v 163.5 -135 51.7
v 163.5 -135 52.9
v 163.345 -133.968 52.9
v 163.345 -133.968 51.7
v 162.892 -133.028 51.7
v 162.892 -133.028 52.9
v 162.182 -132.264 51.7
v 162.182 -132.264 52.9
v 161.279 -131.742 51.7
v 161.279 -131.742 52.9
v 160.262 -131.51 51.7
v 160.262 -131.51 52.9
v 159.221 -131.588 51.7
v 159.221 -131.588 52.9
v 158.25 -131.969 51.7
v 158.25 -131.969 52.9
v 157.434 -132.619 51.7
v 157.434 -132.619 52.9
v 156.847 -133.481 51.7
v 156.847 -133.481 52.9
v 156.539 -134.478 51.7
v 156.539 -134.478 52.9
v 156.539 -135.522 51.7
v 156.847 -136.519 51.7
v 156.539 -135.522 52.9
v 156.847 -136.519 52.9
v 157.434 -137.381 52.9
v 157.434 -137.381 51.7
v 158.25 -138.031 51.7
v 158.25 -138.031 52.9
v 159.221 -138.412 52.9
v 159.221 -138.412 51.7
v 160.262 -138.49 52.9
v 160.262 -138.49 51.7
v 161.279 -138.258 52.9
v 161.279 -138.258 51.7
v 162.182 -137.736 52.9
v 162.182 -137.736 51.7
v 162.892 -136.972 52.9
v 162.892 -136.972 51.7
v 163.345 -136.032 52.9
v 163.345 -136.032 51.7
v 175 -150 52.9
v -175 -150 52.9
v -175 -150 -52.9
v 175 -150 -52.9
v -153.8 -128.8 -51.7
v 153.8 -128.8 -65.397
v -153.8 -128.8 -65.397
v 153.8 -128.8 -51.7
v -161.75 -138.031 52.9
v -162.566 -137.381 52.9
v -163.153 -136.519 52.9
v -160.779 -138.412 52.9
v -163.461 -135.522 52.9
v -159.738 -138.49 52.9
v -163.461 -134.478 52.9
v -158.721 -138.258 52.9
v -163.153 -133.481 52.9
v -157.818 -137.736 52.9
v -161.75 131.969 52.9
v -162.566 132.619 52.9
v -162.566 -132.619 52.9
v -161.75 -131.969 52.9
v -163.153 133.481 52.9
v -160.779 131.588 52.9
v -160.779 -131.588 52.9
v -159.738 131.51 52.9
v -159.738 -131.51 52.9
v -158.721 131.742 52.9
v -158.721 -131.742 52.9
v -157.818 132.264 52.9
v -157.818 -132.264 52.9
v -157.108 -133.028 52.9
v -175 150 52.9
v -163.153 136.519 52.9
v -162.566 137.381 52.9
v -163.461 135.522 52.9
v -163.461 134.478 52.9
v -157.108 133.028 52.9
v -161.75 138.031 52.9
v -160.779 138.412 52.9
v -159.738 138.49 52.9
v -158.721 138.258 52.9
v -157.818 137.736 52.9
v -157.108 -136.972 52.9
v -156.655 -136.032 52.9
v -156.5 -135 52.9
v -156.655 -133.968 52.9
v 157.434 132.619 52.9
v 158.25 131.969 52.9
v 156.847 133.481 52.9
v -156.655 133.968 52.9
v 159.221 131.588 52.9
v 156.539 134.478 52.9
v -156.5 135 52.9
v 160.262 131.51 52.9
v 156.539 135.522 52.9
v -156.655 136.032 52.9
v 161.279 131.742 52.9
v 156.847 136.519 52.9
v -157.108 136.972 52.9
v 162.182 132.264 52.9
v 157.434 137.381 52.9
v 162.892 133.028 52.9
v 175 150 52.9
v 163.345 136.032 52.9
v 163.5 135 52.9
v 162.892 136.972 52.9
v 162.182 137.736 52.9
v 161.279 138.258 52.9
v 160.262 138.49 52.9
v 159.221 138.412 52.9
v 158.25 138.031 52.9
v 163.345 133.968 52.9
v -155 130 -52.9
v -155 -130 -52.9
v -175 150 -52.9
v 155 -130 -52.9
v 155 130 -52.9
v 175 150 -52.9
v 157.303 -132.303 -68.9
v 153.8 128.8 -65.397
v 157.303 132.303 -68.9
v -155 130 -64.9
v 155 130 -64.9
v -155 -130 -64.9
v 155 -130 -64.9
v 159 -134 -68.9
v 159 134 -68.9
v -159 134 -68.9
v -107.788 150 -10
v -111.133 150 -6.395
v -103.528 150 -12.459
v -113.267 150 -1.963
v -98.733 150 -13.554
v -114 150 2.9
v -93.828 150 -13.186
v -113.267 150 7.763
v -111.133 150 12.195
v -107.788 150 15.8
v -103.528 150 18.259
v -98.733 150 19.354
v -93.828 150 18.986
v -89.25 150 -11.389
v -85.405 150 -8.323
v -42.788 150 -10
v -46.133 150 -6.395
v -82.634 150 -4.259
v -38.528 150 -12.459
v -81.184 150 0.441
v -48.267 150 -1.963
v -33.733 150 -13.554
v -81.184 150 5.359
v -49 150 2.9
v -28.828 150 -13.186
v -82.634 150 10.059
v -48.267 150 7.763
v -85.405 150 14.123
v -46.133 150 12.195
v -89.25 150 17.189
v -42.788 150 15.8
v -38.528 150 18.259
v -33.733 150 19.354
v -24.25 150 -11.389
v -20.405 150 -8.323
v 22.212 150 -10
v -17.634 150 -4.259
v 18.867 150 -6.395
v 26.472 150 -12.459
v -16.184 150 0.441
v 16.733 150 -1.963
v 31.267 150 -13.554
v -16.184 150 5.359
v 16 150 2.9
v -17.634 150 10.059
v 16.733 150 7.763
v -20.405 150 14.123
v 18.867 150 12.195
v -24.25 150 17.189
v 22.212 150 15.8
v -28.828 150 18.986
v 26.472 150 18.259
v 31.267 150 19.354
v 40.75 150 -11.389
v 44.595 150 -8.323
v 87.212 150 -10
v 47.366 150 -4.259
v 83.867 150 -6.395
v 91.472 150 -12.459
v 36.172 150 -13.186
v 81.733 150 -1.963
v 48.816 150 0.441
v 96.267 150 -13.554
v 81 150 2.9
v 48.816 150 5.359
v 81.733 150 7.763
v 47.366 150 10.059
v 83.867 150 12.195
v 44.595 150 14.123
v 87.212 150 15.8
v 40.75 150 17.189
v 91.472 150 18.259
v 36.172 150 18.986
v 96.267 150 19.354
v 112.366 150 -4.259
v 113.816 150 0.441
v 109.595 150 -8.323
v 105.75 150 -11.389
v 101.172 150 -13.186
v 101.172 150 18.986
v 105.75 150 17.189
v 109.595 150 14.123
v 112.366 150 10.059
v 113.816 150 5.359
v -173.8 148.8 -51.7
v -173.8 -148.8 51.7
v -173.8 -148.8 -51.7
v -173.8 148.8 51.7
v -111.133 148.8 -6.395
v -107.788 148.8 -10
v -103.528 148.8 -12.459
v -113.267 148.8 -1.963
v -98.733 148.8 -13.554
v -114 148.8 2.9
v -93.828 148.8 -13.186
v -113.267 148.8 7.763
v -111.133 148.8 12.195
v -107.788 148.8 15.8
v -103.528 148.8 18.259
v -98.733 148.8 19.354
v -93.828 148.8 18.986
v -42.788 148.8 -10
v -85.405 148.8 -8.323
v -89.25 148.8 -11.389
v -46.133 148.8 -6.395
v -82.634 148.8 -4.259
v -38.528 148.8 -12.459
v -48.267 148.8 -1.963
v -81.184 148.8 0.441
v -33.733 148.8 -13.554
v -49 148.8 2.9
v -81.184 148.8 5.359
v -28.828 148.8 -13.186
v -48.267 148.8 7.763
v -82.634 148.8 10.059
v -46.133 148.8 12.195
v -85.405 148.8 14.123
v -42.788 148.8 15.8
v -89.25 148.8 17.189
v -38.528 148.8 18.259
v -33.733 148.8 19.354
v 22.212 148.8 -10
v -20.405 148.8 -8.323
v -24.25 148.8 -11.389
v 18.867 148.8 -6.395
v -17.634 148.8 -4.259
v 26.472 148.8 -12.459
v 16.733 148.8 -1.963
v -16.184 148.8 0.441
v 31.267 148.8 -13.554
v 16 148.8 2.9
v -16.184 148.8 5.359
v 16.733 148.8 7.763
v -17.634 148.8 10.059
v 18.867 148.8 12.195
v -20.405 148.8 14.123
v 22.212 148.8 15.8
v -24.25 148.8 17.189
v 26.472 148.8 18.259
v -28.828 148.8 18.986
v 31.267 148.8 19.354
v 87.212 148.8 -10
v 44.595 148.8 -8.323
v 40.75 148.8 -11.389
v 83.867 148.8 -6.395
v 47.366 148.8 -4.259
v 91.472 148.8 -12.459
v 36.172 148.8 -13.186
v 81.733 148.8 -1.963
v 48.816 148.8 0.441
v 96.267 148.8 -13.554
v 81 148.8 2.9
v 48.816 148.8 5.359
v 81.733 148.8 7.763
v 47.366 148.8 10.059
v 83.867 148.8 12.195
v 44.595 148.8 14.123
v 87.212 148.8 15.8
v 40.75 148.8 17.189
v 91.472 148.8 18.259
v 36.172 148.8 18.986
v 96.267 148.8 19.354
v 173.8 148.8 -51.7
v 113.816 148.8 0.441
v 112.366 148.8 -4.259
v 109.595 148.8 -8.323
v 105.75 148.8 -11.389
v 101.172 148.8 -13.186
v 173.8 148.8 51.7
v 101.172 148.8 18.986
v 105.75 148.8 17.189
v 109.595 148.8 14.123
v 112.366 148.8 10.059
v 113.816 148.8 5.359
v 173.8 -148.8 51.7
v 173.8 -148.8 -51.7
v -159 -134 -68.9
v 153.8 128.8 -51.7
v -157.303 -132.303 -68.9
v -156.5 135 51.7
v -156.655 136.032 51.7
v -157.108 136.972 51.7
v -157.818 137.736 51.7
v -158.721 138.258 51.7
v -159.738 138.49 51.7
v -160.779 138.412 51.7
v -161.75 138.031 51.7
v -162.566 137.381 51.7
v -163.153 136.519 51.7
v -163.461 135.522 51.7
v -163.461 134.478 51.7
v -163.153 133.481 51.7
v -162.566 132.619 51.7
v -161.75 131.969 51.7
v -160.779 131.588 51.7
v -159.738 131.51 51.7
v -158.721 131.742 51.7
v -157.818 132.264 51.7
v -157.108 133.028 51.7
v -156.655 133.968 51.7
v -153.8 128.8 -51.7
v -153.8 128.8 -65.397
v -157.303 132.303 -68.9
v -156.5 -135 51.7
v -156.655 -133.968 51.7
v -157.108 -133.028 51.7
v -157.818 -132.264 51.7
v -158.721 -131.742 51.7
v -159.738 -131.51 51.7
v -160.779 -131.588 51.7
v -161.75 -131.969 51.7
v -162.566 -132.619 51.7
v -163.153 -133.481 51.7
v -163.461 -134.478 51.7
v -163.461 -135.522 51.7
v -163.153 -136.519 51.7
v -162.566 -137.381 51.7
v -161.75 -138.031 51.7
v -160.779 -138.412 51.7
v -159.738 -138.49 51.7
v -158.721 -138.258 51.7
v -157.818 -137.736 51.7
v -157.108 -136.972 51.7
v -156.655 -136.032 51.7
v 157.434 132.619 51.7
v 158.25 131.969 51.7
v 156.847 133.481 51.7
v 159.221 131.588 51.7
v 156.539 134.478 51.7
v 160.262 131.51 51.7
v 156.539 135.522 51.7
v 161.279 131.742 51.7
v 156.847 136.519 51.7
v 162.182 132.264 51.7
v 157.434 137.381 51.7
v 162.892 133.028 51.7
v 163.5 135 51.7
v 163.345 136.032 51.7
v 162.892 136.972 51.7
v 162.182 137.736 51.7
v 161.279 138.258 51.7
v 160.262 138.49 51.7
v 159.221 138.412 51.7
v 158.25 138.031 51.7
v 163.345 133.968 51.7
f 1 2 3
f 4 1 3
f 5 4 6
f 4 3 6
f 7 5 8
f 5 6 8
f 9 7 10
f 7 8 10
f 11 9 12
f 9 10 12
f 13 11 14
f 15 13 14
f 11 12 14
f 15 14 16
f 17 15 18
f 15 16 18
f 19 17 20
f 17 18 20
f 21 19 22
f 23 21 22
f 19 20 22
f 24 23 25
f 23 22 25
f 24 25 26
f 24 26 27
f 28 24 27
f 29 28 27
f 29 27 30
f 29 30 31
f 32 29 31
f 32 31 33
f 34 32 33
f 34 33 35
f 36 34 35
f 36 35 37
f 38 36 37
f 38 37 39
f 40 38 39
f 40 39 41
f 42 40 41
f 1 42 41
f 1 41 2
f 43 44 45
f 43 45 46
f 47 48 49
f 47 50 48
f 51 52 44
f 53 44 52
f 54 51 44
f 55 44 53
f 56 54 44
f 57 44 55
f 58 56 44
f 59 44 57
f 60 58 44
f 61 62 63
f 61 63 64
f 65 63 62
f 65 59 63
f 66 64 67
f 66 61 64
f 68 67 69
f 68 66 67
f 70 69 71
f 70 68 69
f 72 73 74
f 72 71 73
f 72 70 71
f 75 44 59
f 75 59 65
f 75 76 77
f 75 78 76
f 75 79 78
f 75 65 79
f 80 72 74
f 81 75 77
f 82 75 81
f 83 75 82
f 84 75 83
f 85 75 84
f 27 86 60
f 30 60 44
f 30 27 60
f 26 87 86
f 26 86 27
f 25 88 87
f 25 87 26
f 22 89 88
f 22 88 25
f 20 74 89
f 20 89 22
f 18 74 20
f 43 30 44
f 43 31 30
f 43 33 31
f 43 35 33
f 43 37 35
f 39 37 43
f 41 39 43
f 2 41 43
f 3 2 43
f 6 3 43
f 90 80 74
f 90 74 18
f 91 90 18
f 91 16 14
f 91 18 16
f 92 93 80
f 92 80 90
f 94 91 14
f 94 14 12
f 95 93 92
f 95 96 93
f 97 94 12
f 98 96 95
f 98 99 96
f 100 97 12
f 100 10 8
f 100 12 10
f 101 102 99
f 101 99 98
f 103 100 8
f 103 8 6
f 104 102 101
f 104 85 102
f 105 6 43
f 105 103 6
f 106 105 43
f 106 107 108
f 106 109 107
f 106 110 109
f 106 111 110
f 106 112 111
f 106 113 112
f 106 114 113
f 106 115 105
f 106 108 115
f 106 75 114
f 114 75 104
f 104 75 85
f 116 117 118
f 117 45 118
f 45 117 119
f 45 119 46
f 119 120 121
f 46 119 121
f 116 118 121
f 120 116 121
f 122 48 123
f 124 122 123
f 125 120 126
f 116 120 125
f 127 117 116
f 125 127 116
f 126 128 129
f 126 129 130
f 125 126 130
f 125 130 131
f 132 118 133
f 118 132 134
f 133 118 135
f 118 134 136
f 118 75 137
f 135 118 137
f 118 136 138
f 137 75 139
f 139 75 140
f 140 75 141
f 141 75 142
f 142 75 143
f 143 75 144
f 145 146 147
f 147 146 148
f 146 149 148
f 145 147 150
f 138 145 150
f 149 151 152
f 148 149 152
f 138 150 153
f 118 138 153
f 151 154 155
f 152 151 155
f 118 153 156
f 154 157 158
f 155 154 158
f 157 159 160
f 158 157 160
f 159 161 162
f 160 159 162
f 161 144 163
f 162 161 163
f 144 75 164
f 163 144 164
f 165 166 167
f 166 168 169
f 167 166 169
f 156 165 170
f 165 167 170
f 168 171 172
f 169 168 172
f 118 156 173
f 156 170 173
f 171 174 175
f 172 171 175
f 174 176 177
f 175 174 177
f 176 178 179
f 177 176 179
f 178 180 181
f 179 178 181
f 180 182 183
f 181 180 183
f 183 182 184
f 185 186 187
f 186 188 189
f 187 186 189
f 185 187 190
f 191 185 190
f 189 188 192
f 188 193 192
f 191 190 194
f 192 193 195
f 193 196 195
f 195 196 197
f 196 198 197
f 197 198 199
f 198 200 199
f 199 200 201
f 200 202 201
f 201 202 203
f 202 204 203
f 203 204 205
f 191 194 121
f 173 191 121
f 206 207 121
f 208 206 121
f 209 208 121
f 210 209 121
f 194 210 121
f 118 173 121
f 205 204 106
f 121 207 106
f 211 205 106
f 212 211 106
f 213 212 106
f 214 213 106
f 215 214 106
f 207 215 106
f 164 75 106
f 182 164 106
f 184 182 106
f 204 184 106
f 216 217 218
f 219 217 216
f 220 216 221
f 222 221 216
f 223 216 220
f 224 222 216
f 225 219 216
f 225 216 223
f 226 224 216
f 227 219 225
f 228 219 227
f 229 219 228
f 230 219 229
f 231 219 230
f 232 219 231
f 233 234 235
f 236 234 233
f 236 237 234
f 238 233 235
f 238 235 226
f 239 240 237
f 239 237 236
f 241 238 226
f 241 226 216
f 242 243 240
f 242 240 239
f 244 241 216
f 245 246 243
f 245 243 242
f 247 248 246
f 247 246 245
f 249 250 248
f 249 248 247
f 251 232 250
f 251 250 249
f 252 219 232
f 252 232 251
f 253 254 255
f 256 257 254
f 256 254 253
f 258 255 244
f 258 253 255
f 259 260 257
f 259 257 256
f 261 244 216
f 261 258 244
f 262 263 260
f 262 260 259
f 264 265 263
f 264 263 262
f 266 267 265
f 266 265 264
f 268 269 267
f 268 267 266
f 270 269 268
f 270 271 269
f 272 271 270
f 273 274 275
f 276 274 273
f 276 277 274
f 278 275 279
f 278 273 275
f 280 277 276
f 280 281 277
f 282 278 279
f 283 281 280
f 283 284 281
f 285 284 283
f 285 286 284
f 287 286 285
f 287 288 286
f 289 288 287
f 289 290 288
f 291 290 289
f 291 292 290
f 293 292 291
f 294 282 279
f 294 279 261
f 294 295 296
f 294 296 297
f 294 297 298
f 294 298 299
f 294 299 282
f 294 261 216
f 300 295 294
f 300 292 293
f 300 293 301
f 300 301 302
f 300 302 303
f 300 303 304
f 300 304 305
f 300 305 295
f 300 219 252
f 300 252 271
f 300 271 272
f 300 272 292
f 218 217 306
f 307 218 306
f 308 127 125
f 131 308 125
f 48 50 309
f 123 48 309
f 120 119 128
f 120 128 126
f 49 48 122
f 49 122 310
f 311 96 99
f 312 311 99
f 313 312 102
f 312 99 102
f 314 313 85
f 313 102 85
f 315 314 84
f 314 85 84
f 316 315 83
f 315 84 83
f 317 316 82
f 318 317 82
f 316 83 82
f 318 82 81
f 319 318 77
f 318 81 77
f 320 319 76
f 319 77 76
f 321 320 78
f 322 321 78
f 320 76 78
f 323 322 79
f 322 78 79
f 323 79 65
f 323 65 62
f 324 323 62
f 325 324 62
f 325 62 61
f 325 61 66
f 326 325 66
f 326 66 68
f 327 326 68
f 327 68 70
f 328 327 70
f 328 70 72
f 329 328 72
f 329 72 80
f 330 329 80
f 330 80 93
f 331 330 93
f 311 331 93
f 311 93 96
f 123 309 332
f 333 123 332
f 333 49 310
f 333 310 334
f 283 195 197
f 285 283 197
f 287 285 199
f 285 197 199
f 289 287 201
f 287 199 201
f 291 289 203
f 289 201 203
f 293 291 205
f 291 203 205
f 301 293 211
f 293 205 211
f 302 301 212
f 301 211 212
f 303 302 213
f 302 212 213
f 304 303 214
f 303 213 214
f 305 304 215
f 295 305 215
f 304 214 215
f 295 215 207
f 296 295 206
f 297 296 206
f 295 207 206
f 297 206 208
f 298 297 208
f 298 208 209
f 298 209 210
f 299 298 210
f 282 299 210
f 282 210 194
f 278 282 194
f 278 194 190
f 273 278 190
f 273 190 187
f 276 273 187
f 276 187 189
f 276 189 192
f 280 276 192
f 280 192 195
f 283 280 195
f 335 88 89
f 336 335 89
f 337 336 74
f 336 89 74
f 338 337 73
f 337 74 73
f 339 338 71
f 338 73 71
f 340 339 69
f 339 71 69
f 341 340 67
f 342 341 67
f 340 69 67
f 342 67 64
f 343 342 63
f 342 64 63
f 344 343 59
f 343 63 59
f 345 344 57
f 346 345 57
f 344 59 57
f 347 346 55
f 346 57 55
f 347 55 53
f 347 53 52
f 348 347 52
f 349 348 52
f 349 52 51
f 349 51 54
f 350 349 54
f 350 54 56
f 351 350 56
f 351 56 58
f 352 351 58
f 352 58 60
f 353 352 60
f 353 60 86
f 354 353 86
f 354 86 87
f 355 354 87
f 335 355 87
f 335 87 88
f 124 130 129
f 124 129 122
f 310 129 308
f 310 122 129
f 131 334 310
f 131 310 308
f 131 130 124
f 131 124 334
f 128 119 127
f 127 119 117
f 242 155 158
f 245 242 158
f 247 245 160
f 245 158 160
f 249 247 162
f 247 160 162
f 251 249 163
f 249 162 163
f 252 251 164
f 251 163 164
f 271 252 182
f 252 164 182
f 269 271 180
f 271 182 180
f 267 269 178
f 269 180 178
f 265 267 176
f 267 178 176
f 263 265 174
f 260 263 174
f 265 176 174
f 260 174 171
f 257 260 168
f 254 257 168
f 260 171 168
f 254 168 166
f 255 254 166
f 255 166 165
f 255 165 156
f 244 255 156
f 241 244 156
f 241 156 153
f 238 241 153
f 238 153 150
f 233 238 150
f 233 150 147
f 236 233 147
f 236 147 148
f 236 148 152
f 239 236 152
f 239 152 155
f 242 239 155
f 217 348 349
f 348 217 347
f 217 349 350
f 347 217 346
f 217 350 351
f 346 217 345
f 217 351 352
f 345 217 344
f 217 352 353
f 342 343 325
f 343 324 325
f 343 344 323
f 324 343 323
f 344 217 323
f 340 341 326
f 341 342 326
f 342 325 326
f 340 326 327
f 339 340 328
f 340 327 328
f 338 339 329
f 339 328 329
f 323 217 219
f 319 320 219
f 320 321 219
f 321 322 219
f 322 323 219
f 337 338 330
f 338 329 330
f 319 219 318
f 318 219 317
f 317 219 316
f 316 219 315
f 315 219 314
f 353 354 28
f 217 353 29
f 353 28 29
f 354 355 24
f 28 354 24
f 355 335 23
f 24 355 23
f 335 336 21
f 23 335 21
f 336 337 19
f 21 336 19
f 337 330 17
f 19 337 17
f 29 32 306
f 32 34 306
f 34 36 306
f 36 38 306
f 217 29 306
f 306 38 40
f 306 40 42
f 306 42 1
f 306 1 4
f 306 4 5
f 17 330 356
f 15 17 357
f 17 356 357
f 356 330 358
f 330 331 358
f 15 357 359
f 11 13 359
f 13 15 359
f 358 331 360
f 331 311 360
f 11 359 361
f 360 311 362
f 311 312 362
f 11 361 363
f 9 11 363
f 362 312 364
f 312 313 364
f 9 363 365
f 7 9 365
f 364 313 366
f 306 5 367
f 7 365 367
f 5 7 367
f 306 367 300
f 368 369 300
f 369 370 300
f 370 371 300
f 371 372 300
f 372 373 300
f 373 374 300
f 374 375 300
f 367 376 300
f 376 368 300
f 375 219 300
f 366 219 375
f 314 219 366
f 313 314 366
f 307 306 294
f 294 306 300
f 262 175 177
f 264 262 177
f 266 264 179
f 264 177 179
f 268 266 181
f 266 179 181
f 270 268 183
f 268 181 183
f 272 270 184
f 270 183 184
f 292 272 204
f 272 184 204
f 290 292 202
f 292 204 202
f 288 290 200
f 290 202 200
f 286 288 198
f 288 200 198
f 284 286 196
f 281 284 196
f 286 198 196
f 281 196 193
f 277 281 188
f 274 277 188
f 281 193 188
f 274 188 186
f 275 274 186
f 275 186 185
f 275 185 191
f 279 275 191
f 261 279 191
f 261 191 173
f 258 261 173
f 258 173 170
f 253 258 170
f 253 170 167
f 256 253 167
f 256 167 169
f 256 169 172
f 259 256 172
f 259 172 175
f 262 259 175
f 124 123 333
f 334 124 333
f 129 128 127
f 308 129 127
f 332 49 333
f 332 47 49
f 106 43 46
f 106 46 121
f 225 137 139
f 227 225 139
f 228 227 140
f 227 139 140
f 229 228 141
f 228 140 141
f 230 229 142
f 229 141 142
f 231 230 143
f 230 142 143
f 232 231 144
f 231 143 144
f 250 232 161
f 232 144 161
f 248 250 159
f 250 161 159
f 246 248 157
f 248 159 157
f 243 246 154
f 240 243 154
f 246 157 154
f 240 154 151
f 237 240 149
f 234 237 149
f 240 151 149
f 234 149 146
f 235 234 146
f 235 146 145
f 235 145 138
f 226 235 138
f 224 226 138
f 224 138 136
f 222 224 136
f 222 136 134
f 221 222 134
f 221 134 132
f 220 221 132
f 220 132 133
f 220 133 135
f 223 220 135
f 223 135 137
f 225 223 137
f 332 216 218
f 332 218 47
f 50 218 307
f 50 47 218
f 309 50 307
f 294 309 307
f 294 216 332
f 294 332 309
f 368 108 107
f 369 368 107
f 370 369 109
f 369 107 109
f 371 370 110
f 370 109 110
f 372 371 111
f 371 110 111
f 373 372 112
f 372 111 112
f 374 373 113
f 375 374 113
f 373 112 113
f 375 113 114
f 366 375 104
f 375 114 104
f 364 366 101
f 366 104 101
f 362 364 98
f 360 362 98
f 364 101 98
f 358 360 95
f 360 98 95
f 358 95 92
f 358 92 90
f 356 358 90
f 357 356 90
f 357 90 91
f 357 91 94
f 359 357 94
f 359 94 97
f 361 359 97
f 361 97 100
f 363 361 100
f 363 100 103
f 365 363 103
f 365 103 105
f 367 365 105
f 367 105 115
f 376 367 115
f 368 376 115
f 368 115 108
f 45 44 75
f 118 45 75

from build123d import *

# Parameters (mm, degrees)
SKETCH_1_W          = 350
SKETCH_1_H          = 300
EXTRUDE_1_DEPTH     = 52.9
SKETCH_2_W          = 310
SKETCH_2_H          = 260
EXTRUDE_2_DEPTH     = 12
SKETCH_6_W          = 310
SKETCH_6_H          = 260
EXTRUDE_3_DEPTH     = 4
EXTRUDE_3_DRAFT     = -45
SHELL_1_T           = -1.2
CUT_EXTRUDE_3_REACH = 262.692
SKETCH_12_R         = 3.5
CUT_EXTRUDE_4_REACH = 356.079
SKETCH_13_R         = 16.5


with BuildPart() as part:
    # 草图1 → 凸台-拉伸1 (new, symmetric)
    with BuildSketch(Plane.XY):
        Rectangle(SKETCH_1_W, SKETCH_1_H)
    extrude(amount=EXTRUDE_1_DEPTH, both=True)

    # 草图2 → 凸台-拉伸2 (add)
    with BuildSketch(Plane(origin=(0, 0, -52.9), x_dir=(-1, 0, 0), z_dir=(0, 0, -1))):
        Rectangle(SKETCH_2_W, SKETCH_2_H)
    extrude(amount=EXTRUDE_2_DEPTH)


with BuildPart() as extrude_3_tool:
    # 草图6 → 凸台-拉伸3 (with draft: the straight prism first)
    with BuildSketch(Plane(origin=(0, 0, -64.9), x_dir=(-1, 0, 0), z_dir=(0, 0, -1))):
        Rectangle(SKETCH_6_W, SKETCH_6_H)
    extrude(amount=EXTRUDE_3_DEPTH)
    # 凸台-拉伸3: the draft: its side faces are tilted about the plane it starts from
    extrude_3_sides = [extrude_3_tool.faces().sort_by_distance(p)[0] for p in [
        (155, 0, -66.9),
        (0, -130, -66.9),
        (-155, 0, -66.9),
        (0, 130, -66.9),
    ]]
    draft(extrude_3_sides, Plane(origin=(0, 0, -64.9), x_dir=(-1, 0, 0), z_dir=(0, 0, -1)), EXTRUDE_3_DRAFT)


with BuildPart() as part_1:
    add(part.part)

    # 凸台-拉伸3: add extrude_3_tool
    add(extrude_3_tool.part)

    # 抽壳1
    shell_1_openings = [part_1.faces().sort_by_distance(p)[0] for p in [
        (0, 0, -68.9),
    ]]
    offset(amount=SHELL_1_T, openings=shell_1_openings, kind=Kind.INTERSECTION)

    # 草图12 → 切除-拉伸3 (cut, up to next)
    with BuildSketch(Plane.XY.offset(52.9), mode=Mode.PRIVATE) as cut_extrude_3_sk1:
        with Locations((-160, 135)):
            Circle(SKETCH_12_R)
    cut_extrude_3_tool1 = extrude(cut_extrude_3_sk1.sketch, amount=-CUT_EXTRUDE_3_REACH, mode=Mode.PRIVATE) & part_1.part
    # 草图12 → 切除-拉伸3 (cut, up to next)
    with BuildSketch(Plane.XY.offset(52.9), mode=Mode.PRIVATE) as cut_extrude_3_sk2:
        with Locations((160, 135)):
            Circle(SKETCH_12_R)
    cut_extrude_3_tool2 = extrude(cut_extrude_3_sk2.sketch, amount=-CUT_EXTRUDE_3_REACH, mode=Mode.PRIVATE) & part_1.part
    # 草图12 → 切除-拉伸3 (cut, up to next)
    with BuildSketch(Plane.XY.offset(52.9), mode=Mode.PRIVATE) as cut_extrude_3_sk3:
        with Locations((160, -135)):
            Circle(SKETCH_12_R)
    cut_extrude_3_tool3 = extrude(cut_extrude_3_sk3.sketch, amount=-CUT_EXTRUDE_3_REACH, mode=Mode.PRIVATE) & part_1.part
    # 草图12 → 切除-拉伸3 (cut, up to next)
    with BuildSketch(Plane.XY.offset(52.9), mode=Mode.PRIVATE) as cut_extrude_3_sk4:
        with Locations((-160, -135)):
            Circle(SKETCH_12_R)
    cut_extrude_3_tool4 = extrude(cut_extrude_3_sk4.sketch, amount=-CUT_EXTRUDE_3_REACH, mode=Mode.PRIVATE) & part_1.part
    add(cut_extrude_3_tool1.solids().sort_by_distance((-160, 135, 52.9))[0], mode=Mode.SUBTRACT)
    add(cut_extrude_3_tool2.solids().sort_by_distance((160, 135, 52.9))[0], mode=Mode.SUBTRACT)
    add(cut_extrude_3_tool3.solids().sort_by_distance((160, -135, 52.9))[0], mode=Mode.SUBTRACT)
    add(cut_extrude_3_tool4.solids().sort_by_distance((-160, -135, 52.9))[0], mode=Mode.SUBTRACT)

    # 草图13 → 切除-拉伸4 (cut, up to next)
    with BuildSketch(Plane(origin=(0, 150, 0), x_dir=(1, 0, 0), z_dir=(0, 1, 0)), mode=Mode.PRIVATE) as cut_extrude_4_sk1:
        with Locations(Location((-32.5, -2.9, 0), (0, 0, 180))):
            Circle(SKETCH_13_R)
    cut_extrude_4_tool1 = extrude(cut_extrude_4_sk1.sketch, amount=-CUT_EXTRUDE_4_REACH, mode=Mode.PRIVATE) & part_1.part
    # 草图13 → 切除-拉伸4 (cut, up to next)
    with BuildSketch(Plane(origin=(0, 150, 0), x_dir=(1, 0, 0), z_dir=(0, 1, 0)), mode=Mode.PRIVATE) as cut_extrude_4_sk2:
        with Locations(Location((32.5, -2.9, 0), (0, 0, 180))):
            Circle(SKETCH_13_R)
    cut_extrude_4_tool2 = extrude(cut_extrude_4_sk2.sketch, amount=-CUT_EXTRUDE_4_REACH, mode=Mode.PRIVATE) & part_1.part
    # 草图13 → 切除-拉伸4 (cut, up to next)
    with BuildSketch(Plane(origin=(0, 150, 0), x_dir=(1, 0, 0), z_dir=(0, 1, 0)), mode=Mode.PRIVATE) as cut_extrude_4_sk3:
        with Locations(Location((97.5, -2.9, 0), (0, 0, 180))):
            Circle(SKETCH_13_R)
    cut_extrude_4_tool3 = extrude(cut_extrude_4_sk3.sketch, amount=-CUT_EXTRUDE_4_REACH, mode=Mode.PRIVATE) & part_1.part
    # 草图13 → 切除-拉伸4 (cut, up to next)
    with BuildSketch(Plane(origin=(0, 150, 0), x_dir=(1, 0, 0), z_dir=(0, 1, 0)), mode=Mode.PRIVATE) as cut_extrude_4_sk4:
        with Locations(Location((-97.5, -2.9, 0), (0, 0, 180))):
            Circle(SKETCH_13_R)
    cut_extrude_4_tool4 = extrude(cut_extrude_4_sk4.sketch, amount=-CUT_EXTRUDE_4_REACH, mode=Mode.PRIVATE) & part_1.part
    add(cut_extrude_4_tool1.solids().sort_by_distance((-32.5, 150, 2.9))[0], mode=Mode.SUBTRACT)
    add(cut_extrude_4_tool2.solids().sort_by_distance((32.5, 150, 2.9))[0], mode=Mode.SUBTRACT)
    add(cut_extrude_4_tool3.solids().sort_by_distance((97.5, 150, 2.9))[0], mode=Mode.SUBTRACT)
    add(cut_extrude_4_tool4.solids().sort_by_distance((-97.5, 150, 2.9))[0], mode=Mode.SUBTRACT)


solid = part_1.part
